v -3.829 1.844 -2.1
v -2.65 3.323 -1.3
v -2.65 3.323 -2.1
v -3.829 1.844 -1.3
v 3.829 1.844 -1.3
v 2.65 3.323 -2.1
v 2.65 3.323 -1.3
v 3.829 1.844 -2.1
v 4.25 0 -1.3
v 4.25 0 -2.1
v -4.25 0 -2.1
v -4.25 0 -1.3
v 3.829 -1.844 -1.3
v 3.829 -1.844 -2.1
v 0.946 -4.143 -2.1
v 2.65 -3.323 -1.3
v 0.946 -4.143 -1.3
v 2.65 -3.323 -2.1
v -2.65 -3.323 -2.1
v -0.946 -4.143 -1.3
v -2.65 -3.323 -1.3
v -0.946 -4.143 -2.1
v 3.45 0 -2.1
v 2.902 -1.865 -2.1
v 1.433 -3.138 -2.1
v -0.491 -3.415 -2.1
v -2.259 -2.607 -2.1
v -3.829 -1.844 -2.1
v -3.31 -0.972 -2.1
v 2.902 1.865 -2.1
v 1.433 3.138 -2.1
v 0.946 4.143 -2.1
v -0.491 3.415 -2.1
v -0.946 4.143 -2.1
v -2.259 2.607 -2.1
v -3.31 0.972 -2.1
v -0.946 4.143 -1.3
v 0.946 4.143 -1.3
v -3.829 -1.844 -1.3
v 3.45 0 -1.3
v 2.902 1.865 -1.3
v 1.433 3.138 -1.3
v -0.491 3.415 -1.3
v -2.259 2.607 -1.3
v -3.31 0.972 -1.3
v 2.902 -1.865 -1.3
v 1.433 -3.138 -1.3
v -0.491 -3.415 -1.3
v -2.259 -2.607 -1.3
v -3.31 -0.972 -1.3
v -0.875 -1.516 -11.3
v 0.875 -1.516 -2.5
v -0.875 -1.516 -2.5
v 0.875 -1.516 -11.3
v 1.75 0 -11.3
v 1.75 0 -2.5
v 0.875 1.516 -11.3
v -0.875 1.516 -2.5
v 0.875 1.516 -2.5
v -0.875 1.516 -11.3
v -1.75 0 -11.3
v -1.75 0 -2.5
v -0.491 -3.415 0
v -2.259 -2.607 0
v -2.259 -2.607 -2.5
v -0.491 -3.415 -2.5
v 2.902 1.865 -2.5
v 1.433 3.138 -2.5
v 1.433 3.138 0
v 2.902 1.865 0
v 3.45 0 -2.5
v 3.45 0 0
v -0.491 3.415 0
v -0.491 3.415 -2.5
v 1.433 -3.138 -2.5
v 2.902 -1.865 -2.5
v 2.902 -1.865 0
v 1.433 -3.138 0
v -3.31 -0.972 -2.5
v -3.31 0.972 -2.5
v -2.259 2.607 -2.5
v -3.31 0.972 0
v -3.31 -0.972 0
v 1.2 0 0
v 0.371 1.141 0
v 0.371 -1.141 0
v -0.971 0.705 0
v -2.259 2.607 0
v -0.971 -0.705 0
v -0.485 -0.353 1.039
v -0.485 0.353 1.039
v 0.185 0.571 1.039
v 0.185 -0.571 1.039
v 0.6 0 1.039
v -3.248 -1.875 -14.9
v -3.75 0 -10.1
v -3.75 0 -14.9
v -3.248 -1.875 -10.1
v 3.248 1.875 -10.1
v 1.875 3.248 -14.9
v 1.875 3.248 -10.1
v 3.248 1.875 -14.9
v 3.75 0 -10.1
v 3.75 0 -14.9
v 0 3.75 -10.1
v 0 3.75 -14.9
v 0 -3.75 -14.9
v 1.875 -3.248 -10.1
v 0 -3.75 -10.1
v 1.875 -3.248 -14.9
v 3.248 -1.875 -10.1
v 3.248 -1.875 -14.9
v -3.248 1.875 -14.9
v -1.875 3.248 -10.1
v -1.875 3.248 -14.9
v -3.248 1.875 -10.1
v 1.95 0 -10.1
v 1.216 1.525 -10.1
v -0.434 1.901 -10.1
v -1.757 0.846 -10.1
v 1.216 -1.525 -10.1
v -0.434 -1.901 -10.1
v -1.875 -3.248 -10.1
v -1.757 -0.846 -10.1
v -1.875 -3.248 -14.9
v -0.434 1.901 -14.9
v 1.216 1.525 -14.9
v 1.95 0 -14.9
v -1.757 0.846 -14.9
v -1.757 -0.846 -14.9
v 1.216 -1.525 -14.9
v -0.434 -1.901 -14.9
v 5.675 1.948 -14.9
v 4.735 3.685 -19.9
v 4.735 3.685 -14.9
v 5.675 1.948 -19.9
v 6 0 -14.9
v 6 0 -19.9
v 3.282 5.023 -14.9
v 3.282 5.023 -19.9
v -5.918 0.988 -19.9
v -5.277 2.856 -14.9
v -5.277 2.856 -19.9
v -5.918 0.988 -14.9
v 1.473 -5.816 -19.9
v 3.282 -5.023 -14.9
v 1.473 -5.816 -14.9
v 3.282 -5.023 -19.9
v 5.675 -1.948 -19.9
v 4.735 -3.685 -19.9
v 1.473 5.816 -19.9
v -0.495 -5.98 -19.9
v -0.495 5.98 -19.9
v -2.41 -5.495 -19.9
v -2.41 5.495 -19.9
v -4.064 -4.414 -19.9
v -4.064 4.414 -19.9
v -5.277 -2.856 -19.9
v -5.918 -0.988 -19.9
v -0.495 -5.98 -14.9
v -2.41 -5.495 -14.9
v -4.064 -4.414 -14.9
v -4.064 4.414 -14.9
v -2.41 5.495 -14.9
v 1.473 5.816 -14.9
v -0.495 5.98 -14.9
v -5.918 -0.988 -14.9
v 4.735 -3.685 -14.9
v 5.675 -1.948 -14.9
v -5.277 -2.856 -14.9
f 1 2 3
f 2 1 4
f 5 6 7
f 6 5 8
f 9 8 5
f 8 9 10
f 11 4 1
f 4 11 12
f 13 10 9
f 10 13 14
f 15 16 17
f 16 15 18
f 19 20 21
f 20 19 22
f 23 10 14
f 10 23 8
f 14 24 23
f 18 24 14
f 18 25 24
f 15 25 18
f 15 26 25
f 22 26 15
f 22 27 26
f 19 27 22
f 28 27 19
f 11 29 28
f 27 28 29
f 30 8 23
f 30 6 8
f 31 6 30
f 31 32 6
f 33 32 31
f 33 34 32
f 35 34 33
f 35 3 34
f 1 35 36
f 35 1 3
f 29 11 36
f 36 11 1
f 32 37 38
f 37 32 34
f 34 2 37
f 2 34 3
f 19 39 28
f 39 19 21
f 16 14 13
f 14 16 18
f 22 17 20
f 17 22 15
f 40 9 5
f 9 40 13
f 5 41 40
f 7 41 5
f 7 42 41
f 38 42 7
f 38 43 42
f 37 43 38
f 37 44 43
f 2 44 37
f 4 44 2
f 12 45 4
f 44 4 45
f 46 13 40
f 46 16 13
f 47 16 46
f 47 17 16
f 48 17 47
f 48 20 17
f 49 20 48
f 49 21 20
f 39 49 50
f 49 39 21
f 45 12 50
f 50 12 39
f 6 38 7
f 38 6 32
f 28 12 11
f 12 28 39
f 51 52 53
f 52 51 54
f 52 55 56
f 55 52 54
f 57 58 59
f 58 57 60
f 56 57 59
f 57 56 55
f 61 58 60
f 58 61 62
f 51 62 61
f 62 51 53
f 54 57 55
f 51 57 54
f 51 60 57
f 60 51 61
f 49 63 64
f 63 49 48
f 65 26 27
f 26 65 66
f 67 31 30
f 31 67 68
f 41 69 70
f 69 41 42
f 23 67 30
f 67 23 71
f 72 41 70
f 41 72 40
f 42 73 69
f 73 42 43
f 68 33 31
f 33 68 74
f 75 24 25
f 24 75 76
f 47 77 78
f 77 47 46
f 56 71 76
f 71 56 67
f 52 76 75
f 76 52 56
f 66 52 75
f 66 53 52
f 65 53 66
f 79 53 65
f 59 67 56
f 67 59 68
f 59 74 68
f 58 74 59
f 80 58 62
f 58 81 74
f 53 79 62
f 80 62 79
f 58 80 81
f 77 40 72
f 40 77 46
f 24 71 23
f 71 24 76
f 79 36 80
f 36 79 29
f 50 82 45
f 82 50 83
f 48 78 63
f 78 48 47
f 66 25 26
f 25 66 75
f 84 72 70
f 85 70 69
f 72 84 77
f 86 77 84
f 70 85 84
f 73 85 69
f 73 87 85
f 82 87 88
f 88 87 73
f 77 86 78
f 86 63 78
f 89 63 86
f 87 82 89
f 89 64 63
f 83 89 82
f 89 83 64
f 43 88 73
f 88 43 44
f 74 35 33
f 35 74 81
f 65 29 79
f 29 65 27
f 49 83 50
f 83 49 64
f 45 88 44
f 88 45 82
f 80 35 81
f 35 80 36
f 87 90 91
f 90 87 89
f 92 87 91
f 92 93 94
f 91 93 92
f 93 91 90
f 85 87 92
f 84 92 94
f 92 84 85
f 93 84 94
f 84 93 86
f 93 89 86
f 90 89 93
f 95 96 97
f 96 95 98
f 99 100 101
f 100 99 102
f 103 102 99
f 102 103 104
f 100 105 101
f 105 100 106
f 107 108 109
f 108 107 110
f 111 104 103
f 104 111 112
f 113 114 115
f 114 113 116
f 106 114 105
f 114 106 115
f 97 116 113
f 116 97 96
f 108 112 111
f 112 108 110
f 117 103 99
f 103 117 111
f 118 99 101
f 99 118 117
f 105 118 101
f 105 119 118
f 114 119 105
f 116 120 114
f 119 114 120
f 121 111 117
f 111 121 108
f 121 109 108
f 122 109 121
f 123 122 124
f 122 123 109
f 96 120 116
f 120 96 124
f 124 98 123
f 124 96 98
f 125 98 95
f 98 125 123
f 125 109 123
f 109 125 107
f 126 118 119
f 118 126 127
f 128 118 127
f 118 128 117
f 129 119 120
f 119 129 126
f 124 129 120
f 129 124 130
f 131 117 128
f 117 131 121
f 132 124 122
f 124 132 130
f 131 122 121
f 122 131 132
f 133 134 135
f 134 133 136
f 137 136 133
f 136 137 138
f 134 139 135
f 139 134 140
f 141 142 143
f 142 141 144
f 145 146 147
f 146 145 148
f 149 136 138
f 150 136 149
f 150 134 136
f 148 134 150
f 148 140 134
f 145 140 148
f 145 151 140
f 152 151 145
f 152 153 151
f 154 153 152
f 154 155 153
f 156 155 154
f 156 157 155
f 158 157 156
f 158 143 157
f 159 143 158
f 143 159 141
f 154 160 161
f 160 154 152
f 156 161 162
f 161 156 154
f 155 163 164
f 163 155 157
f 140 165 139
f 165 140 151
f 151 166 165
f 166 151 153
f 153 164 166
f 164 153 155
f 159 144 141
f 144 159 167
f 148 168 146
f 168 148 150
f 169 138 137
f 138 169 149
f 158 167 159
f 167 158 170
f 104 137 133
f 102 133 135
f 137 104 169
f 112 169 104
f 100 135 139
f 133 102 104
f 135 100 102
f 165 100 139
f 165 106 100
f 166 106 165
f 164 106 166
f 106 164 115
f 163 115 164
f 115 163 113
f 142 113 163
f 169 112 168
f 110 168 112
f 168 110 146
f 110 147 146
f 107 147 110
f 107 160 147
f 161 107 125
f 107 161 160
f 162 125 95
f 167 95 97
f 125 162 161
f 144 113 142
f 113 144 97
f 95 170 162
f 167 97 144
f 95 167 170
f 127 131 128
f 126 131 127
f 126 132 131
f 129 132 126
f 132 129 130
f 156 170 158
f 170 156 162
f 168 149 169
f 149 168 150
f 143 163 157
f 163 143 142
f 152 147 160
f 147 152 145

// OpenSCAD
// Parameters
shaft_diameter_mm = 3.5; //[1.75:7:0.05]
length_mm = 10; //[5:20:0.1]
head_diameter_mm = 6.9; //[3.45:13.8:0.05]
head_height_mm = 2.5; //[1.25:5:0.05]

// Use 1-2mm overlap to guarantee watertight connections
overlap_mm = 1.2; //[0.2:2:0.1]

head_rounding_mm = 1.2; //[0.4:2.5:0.1]
washer_thickness_mm = 0.8; //[0.4:2:0.1]
washer_outer_diameter_mm = 8.5; //[5:17:0.1]
washer_inner_diameter_mm = 3.9; //[2.5:6:0.05]
spacer_height_mm = 6; //[3:12:0.1]
spacer_wall_mm = 1.8; //[0.9:3.6:0.1]
buzzer_diameter_mm = 12; //[6:24:0.1]
buzzer_height_mm = 5; //[2.5:10:0.1]

// --- Derived Z layout (all parts stacked and overlapping) ---
// Coordinate convention: screw head on top, shaft goes downward.
// z=0 is the top surface of the head.
head_top_z      = 0;
head_bottom_z   = head_top_z - head_height_mm;

// Washer overlaps into head/shaft region
washer_top_z    = head_bottom_z + overlap_mm;
washer_bottom_z = washer_top_z - washer_thickness_mm;

// Shaft overlaps into head
shaft_top_z     = head_bottom_z + overlap_mm;
shaft_bottom_z  = shaft_top_z - length_mm;

// Spacer MUST overlap into shaft end (fix: ensure spacer top is ABOVE shaft bottom by overlap)
spacer_top_z    = shaft_bottom_z + overlap_mm;
spacer_bottom_z = spacer_top_z - spacer_height_mm;

// Buzzer MUST overlap into spacer (fix: ensure buzzer top is ABOVE spacer bottom by overlap)
buzzer_top_z    = spacer_bottom_z + overlap_mm;
buzzer_bottom_z = buzzer_top_z - buzzer_height_mm;

// Screw + washer (single connected solid)
module screw_and_washer() {
  union() {
    color("DimGray") union() {
      // Shaft
      translate([0, 0, (shaft_top_z + shaft_bottom_z)/2])
        cylinder(h=length_mm, r=shaft_diameter_mm/2, center=true);

      // Head
      translate([0, 0, (head_top_z + head_bottom_z)/2])
        cylinder(h=head_height_mm, r=head_diameter_mm/2, center=true);

      // Head dome (sunk slightly to ensure intersection with head)
      translate([0, 0, head_top_z - head_rounding_mm + overlap_mm])
        sphere(r=head_rounding_mm);

      // Washer (overlaps into head/shaft region)
      difference() {
        translate([0, 0, (washer_top_z + washer_bottom_z)/2])
          cylinder(h=washer_thickness_mm, r=washer_outer_diameter_mm/2, center=true);
        translate([0, 0, (washer_top_z + washer_bottom_z)/2])
          cylinder(h=washer_thickness_mm + 2*overlap_mm, r=washer_inner_diameter_mm/2, center=true);
      }
    }
  }
}

// Light gray hex/cylindrical collar (PCB spacer) - attached to shaft end with overlap
module pcb_spacer() {
  color("Silver")
  difference() {
    translate([0, 0, (spacer_top_z + spacer_bottom_z)/2])
      cylinder(h=spacer_height_mm, r=washer_inner_diameter_mm/2 + spacer_wall_mm, center=true);
    translate([0, 0, (spacer_top_z + spacer_bottom_z)/2])
      cylinder(h=spacer_height_mm + 2*overlap_mm, r=washer_inner_diameter_mm/2, center=true);
  }
}

// Large black cylindrical piece (buzzer) - attached to spacer with overlap
module buzzer() {
  color("Black")
  translate([0, 0, (buzzer_top_z + buzzer_bottom_z)/2])
    cylinder(h=buzzer_height_mm, r=buzzer_diameter_mm/2, center=true);
}

// Assembly: ensure EVERYTHING is one connected solid via union()
// (Fix: add small "fuse" cylinders to guarantee physical connection even if
// boolean differences create coincident/near-coincident surfaces.)
module assembly() {
  union() {
    screw_and_washer();
    pcb_spacer();
    buzzer();

    // Fuse shaft <-> spacer (solid core overlap)
    color("Silver")
    translate([0, 0, shaft_bottom_z + overlap_mm/2])
      cylinder(h=overlap_mm, r=shaft_diameter_mm/2, center=true);

    // Fuse spacer <-> buzzer (solid core overlap)
    color("Black")
    translate([0, 0, spacer_bottom_z + overlap_mm/2])
      cylinder(h=overlap_mm, r=washer_inner_diameter_mm/2, center=true);
  }
}

assembly();
